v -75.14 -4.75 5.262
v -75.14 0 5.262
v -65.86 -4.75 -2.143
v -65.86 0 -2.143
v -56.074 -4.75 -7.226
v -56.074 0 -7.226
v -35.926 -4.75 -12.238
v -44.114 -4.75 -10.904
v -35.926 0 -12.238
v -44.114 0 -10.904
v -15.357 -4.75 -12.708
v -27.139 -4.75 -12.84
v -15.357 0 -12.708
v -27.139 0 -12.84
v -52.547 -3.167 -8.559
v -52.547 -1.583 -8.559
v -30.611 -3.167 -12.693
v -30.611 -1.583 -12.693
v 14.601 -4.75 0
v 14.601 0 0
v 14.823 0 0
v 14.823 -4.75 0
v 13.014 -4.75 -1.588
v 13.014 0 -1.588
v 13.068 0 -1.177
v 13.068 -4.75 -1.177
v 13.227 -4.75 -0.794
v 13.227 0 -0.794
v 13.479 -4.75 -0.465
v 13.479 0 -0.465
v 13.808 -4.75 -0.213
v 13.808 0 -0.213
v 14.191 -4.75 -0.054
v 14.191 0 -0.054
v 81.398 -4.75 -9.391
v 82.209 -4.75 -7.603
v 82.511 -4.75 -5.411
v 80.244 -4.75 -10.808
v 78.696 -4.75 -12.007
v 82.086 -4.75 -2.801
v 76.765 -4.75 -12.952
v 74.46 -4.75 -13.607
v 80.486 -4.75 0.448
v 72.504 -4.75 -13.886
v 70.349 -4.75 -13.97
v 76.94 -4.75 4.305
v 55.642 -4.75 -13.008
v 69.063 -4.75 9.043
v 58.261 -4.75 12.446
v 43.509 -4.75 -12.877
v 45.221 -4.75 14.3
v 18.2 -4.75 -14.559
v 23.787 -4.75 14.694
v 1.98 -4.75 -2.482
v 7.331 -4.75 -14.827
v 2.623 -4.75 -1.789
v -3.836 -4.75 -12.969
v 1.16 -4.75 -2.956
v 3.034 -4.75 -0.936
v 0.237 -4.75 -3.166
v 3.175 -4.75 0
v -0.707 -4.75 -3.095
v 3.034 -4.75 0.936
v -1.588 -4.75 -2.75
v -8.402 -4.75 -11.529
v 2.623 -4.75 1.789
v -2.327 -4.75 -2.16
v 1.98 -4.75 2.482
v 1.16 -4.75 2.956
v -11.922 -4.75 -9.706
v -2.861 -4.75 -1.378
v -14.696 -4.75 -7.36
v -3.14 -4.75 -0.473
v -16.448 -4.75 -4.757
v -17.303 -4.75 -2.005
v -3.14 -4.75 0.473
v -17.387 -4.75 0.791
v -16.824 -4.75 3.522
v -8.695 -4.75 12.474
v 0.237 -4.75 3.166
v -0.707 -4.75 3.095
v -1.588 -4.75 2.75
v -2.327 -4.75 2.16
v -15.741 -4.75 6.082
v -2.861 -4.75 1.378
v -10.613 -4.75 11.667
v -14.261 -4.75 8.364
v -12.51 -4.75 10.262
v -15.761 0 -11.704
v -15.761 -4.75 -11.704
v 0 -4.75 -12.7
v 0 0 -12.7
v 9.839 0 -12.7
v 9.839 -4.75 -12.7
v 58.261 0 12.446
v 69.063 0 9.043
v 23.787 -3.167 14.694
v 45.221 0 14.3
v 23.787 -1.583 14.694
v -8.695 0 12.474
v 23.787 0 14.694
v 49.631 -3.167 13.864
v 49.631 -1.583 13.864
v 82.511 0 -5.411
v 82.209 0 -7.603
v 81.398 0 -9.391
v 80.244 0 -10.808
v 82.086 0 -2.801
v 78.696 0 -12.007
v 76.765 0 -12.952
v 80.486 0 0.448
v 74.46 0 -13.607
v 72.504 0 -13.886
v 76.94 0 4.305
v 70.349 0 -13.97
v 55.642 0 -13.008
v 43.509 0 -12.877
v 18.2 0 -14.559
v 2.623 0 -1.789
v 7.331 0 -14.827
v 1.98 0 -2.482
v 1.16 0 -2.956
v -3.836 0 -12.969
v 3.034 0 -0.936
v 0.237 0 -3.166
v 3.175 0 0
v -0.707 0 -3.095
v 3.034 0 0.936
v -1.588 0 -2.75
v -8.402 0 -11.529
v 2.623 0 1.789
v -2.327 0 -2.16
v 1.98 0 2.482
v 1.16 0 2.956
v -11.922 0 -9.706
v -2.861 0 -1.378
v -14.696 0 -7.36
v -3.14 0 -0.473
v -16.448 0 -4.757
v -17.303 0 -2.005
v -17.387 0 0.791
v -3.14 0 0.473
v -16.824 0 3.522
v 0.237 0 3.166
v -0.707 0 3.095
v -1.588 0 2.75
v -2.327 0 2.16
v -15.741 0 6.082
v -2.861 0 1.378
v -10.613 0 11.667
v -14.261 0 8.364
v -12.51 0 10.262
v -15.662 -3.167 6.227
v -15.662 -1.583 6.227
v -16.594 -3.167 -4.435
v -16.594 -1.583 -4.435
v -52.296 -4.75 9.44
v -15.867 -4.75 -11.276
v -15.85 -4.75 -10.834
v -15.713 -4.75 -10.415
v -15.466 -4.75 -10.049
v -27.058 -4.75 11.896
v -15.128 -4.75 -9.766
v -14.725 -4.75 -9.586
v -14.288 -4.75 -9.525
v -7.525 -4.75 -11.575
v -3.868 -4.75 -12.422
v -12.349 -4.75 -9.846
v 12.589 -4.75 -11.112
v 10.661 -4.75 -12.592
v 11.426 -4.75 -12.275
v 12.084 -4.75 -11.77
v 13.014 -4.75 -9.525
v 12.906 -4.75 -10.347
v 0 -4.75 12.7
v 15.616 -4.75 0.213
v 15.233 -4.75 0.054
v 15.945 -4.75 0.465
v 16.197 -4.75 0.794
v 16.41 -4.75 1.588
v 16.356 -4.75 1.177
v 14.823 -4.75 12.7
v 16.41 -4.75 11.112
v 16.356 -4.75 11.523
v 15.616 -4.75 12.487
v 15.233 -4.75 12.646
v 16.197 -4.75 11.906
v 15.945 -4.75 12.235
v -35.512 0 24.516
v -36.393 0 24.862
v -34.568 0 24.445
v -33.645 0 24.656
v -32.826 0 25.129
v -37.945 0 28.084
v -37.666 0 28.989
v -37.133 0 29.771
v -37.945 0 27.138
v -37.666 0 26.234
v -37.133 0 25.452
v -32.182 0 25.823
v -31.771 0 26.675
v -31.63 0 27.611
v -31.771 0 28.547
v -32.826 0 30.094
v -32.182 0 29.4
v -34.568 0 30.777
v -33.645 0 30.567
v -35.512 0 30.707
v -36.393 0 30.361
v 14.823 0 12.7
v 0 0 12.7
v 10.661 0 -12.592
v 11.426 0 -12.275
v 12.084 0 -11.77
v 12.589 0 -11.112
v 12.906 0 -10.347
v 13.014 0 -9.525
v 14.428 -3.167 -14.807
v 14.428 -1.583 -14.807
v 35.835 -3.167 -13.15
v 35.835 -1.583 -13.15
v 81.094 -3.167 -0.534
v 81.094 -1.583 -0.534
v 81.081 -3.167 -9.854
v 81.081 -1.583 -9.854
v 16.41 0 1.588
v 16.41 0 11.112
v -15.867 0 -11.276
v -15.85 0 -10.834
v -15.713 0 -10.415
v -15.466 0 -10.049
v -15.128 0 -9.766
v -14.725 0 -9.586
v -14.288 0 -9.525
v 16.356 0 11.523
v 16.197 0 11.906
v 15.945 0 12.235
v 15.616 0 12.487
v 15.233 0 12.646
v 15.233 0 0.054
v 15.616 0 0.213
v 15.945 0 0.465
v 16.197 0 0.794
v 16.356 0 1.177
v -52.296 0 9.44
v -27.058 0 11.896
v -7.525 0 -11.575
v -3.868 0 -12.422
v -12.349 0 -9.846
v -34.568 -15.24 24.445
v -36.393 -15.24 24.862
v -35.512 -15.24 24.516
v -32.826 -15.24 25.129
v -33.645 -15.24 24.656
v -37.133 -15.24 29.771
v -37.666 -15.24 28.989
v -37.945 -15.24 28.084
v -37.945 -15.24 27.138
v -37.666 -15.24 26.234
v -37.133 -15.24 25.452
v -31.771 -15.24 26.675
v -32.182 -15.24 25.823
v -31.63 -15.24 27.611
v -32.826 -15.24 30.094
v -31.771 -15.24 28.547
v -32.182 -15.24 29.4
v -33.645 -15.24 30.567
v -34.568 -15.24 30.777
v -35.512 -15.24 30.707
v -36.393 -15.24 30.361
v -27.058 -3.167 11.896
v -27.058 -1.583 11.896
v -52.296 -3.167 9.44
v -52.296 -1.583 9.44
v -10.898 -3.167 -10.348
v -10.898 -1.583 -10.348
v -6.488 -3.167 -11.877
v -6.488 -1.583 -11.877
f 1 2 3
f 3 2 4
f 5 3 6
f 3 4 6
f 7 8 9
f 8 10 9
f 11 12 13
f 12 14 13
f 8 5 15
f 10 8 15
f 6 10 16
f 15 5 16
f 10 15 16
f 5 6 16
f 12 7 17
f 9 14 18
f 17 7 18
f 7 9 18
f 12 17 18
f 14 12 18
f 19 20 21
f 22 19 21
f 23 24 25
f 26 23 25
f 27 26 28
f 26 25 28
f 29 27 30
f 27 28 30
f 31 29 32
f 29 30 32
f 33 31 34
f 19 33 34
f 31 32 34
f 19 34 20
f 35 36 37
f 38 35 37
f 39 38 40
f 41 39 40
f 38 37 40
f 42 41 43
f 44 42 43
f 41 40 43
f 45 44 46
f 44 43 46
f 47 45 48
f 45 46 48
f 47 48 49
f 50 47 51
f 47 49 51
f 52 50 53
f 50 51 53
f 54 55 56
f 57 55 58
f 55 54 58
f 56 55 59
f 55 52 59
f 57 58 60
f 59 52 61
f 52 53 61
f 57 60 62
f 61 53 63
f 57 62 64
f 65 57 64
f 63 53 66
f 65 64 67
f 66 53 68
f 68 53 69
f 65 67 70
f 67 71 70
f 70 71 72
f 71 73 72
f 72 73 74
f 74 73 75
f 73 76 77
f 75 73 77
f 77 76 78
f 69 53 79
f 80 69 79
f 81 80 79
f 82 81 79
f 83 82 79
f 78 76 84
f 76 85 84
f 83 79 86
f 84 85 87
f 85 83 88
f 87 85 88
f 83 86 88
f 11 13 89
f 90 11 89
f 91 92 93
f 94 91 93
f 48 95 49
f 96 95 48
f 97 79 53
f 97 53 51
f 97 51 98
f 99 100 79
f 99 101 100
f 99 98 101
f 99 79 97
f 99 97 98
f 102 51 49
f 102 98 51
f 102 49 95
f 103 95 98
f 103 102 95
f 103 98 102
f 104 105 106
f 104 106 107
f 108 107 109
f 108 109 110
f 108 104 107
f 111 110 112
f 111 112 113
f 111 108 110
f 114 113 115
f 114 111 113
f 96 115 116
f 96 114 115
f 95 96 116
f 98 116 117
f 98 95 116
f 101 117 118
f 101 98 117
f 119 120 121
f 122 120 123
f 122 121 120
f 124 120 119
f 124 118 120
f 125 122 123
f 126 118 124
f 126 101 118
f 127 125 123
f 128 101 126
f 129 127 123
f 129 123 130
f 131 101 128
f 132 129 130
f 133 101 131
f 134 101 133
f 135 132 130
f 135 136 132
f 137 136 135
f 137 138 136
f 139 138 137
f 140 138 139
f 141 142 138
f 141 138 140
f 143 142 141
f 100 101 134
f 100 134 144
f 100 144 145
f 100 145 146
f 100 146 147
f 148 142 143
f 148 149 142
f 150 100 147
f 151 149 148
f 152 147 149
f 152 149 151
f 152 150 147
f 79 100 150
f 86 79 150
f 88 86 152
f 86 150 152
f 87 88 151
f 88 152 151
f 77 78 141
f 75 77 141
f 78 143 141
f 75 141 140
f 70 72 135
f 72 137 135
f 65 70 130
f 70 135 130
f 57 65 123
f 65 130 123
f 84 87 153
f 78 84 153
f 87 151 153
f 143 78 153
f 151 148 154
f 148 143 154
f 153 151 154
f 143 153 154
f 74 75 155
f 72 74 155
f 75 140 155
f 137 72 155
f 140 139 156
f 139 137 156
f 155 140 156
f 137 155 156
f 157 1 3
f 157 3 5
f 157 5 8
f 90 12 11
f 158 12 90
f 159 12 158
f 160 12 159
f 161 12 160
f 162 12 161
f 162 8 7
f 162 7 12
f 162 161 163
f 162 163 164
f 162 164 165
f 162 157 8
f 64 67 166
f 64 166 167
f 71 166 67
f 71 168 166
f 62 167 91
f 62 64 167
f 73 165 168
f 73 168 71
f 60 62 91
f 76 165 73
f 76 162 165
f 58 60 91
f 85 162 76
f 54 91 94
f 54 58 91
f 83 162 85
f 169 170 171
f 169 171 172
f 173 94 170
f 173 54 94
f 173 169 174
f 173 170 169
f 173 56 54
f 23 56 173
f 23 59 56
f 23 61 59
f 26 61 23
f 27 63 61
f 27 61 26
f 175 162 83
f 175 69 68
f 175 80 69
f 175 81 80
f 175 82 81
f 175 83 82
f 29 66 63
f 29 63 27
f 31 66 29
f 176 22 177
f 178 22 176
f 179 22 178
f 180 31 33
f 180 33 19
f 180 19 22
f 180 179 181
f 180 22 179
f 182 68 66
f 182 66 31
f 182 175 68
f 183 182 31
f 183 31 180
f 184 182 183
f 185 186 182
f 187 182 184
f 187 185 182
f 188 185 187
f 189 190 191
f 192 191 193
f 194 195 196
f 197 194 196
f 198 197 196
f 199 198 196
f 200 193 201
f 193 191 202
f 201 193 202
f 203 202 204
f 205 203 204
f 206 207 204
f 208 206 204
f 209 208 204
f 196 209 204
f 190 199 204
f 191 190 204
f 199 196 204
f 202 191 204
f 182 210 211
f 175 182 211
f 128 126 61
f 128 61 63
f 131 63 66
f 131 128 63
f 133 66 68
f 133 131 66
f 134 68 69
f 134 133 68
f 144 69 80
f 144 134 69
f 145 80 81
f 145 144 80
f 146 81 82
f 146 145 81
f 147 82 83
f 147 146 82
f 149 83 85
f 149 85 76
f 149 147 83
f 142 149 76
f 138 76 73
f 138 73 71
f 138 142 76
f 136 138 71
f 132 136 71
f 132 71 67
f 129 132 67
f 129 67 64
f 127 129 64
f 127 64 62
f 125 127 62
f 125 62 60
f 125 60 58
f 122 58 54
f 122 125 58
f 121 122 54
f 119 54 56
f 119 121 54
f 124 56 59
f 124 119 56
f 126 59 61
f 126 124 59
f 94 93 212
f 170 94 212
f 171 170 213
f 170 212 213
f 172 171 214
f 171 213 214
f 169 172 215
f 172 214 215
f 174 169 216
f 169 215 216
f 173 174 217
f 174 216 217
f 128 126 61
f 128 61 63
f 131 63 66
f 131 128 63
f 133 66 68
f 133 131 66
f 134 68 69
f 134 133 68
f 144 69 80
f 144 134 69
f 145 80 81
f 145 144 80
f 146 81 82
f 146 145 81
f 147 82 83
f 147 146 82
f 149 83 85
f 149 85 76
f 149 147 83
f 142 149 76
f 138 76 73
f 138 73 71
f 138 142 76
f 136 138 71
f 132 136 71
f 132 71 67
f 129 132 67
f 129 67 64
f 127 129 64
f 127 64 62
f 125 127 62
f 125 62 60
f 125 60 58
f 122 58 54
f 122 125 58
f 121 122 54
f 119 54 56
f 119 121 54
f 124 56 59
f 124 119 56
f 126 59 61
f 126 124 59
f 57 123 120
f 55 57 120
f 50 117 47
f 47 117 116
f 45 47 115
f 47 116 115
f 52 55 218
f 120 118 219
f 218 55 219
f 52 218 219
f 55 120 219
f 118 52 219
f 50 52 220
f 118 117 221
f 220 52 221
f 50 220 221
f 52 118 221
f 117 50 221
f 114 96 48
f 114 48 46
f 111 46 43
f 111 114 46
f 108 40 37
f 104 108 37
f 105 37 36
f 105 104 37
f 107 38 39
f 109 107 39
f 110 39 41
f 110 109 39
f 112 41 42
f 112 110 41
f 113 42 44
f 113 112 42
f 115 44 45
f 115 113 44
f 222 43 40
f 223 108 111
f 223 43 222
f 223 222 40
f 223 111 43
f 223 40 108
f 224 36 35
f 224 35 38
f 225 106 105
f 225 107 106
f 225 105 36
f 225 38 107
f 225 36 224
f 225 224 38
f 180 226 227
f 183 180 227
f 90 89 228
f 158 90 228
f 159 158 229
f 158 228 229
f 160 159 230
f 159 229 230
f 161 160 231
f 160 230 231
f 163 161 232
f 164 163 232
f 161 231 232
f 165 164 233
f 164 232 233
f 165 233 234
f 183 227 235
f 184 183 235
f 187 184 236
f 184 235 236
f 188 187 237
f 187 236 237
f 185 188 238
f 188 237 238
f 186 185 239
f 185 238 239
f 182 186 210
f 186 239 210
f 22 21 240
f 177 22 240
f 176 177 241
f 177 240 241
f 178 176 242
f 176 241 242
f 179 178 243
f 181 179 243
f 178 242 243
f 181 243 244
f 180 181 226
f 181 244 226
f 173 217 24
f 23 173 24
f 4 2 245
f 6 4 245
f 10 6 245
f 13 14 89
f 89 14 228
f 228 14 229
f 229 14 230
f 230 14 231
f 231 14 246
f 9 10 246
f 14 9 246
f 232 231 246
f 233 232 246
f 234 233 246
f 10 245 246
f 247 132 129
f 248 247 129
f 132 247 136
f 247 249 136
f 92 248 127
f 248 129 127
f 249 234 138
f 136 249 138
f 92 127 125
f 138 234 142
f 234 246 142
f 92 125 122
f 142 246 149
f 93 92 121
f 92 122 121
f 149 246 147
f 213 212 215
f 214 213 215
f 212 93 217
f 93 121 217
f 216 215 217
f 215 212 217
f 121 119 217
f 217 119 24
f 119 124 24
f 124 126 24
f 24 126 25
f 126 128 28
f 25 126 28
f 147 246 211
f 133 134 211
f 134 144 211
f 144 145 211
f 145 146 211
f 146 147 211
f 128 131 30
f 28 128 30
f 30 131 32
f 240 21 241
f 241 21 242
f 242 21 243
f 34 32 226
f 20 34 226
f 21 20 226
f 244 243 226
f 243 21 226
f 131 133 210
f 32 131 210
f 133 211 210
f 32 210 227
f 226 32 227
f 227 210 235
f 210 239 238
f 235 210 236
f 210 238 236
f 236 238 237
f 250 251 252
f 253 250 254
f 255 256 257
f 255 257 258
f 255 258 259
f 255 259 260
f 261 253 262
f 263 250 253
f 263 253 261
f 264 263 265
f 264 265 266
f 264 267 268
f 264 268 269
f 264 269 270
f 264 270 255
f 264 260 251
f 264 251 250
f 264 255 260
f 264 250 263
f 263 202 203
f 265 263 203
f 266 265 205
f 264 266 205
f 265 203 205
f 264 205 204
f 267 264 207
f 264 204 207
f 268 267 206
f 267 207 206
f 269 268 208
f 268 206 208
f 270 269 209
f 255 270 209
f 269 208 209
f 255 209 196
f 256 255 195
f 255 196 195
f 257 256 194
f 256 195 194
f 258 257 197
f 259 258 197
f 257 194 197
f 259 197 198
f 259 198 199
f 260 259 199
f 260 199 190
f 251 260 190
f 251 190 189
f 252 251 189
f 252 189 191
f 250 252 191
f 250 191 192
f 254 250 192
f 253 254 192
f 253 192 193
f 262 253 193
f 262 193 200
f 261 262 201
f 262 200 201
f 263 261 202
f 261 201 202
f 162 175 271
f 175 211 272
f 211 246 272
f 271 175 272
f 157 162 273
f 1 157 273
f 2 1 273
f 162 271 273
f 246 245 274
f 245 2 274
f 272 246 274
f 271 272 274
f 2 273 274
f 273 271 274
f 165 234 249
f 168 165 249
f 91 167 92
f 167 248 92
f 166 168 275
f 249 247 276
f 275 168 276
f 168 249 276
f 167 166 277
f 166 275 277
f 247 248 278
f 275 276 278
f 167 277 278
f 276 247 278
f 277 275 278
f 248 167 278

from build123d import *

# Parameters (mm, degrees)
F0_R     = 3.175
F1_DEPTH = 4.7498
F2_R     = 3.175
F3_DEPTH = 4.7498
F4_R     = 3.175
F5_DEPTH = 15.24


with BuildPart() as f1:
    # F0 (on Front) → F1 (new body)
    with BuildSketch(Plane.XZ):
        with BuildLine():
            add(Edge.make_bspline(
                [(0, 12.7), (-27.778189, 12.7), (-53.683318, 10.3229), (-75.140081, 5.262344)],
                knots=[0, 0, 0, 0, 75.507288, 75.507288, 75.507288, 75.507288], degree=3))
            add(Edge.make_bspline(
                [(-75.140081, 5.262344), (-54.227666, -15.259189), (-25.261352, -12.895799), (-15.357332, -12.708435)],
                knots=[0, 0, 0, 0, 61.183257, 61.183257, 61.183257, 61.183257], degree=3))
            Line((-15.357332, -12.708435), (-15.760655, -11.704082))
            ThreePointArc((-15.760655, -11.704082), (-15.60266, -10.223394), (-14.2875, -9.525))
            add(Edge.make_bspline(
                [(-14.2875, -9.525), (-11.05533, -9.525), (-7.879092, -12.7), (0, -12.7)],
                knots=[0, 0, 0, 0, 14.636027, 14.636027, 14.636027, 14.636027], degree=3))
            Line((0, -12.7), (9.838992, -12.7))
            ThreePointArc((9.838992, -12.7), (12.084056, -11.770064), (13.013992, -9.525))
            Line((13.013992, -9.525), (13.013992, -1.5875))
            ThreePointArc((13.013992, -1.5875), (13.47896, -0.464968), (14.601492, 0))
            Line((14.601492, 0), (14.822604, 0))
            ThreePointArc((14.822604, 0), (15.945136, 0.464968), (16.410104, 1.5875))
            Line((16.410104, 1.5875), (16.410104, 11.1125))
            ThreePointArc((16.410104, 11.1125), (15.945136, 12.235032), (14.822604, 12.7))
            Line((14.822604, 12.7), (0, 12.7))
        make_face()
        Circle(F0_R, mode=Mode.SUBTRACT)
    extrude(amount=F1_DEPTH)


with BuildPart() as f3:
    # F2 (on Front) → F3 (new body)
    with BuildSketch(Plane.XZ):
        with BuildLine():
            add(Edge.make_bspline(
                [(-8.695447, 12.473822), (27.181917, 15.904326), (52.762751, 16.174525), (69.062658, 9.043317)],
                knots=[0, 0, 0, 0, 77.833741, 77.833741, 77.833741, 77.833741], degree=3))
            add(Edge.make_bspline(
                [(-8.695447, 12.473822), (-16.128207, 10.615632), (-25.990908, -7.680394), (-3.835565, -12.969089)],
                knots=[0, 0, 0, 0, 25.902898, 25.902898, 25.902898, 25.902898], degree=3))
            add(Edge.make_bspline(
                [(-3.835565, -12.969089), (16.175712, -18.543659), (25.961988, -9.922196), (70.349097, -13.969653)],
                knots=[0, 0, 0, 0, 74.19141, 74.19141, 74.19141, 74.19141], degree=3))
            add(Edge.make_bspline(
                [(69.062658, 9.043317), (87.558728, 0.986704), (85.999258, -14.104567), (70.349097, -13.969653)],
                knots=[0, 0, 0, 0, 23.048899, 23.048899, 23.048899, 23.048899], degree=3))
        make_face()
        Circle(F2_R, mode=Mode.SUBTRACT)
    extrude(amount=F3_DEPTH)


with BuildPart() as f5:
    # F4 (on Front) → F5 (new body)
    with BuildSketch(Plane.XZ):
        with Locations((-34.805175, 27.611218)):
            Circle(F4_R)
    extrude(amount=F5_DEPTH)


solid = Compound([f1.part, f3.part, f5.part])
